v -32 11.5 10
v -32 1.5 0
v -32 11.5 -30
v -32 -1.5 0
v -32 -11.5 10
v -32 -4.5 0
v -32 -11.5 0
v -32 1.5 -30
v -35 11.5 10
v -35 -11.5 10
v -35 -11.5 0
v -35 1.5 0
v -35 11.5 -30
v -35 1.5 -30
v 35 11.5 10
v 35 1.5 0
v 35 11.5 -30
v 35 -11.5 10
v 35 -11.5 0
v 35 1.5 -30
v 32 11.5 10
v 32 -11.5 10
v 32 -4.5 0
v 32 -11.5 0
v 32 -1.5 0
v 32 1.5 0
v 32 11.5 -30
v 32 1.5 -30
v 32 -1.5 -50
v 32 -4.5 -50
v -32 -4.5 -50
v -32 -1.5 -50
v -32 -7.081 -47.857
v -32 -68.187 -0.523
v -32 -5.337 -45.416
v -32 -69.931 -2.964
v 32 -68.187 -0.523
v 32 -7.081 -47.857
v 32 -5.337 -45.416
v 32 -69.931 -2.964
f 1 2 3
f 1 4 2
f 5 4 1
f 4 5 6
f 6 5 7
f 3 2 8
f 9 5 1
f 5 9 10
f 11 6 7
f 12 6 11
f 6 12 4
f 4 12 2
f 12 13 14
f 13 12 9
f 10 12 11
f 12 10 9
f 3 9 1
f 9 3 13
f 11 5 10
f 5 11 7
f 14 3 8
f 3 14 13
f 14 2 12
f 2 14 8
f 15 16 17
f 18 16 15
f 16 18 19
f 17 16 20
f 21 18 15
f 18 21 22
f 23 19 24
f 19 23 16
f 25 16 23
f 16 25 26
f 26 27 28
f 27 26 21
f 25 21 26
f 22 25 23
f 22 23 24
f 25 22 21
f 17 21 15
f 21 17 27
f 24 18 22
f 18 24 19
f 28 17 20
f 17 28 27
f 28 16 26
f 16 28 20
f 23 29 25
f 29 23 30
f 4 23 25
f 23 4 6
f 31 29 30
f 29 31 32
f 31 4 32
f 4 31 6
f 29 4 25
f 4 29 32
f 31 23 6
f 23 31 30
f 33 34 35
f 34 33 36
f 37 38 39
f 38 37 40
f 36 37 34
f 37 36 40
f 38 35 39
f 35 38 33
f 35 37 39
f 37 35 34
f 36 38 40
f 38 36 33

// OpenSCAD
// file: front.scad
include <../config.scad>;

module pot_front()
{
    angle = atan(pot_y/pot_z);
    diagonal_length = sqrt(pow(pot_y,2) + pow(pot_z,2));

    e = material_z/2;
    m = material_z;
    d1 = m / sin(angle);
    f = sin(angle) * e;
    d2 = f / sin(90-angle);
    lower_inset = d1 + d2;

    upper_inset = 3;

    translate([
        0,
        -sin(angle)*lower_inset - material_z/2,
        -pot_z + sin(90-angle)*lower_inset
        ])
    rotate([
        angle,
        0,
        0
        ])
    // rotate round the bottom middle
    translate([
        0,
        0,
        (diagonal_length - lower_inset - upper_inset)/2
        ])
    cube([
        pot_x - 2*material_z,
        material_z,
        diagonal_length - lower_inset - upper_inset
        ], center=true);
}

pot_front();
// file: back.scad
include <../config.scad>;

module pot_back()
{
    translate([
        0,
        -material_z,
        -pot_z/2
        ])
    cube([
        pot_x - 2*material_z,
        material_z,
        pot_z
        ], center=true);
}

pot_back();
// file: side.scad
include <../config.scad>;

module pot_side(x)
{
    translate([
        x,
        -material_z/2,
        0
        ])
    intersection()
    {
        // scale to configured size
        scale([
            material_z,
            pot_y,
            pot_z
            ])
        // rotate into yz plane
        rotate([
            0,
            90,
            0
            ])
        circle(
            r=1
            );

        // z: negative, y: negative
        translate([
            0,
            -pot_y,
            -pot_z
            ])
        cube([
            2*material_z,
            2*pot_y,
            2*pot_z
            ], center=true);
    }

    // upper hook part
    translate([
        x,
        0,
        hook_width/2
        ])
    cube([
        material_z,
        hook_width*2 + material_z,
        hook_width
        ], center=true);

    // hook
    translate([
        x,
        hook_width/2 + material_z/2,
        -support_z/2
        ])
    cube([
        material_z,
        hook_width,
        support_z
        ], center=true);
}

pot_side(0);
// file: ../config.scad
// all measures in millimeters

// rendering quality
$fn = 200;

// material to cut from
material_z = 3;

// wall configuration: bounding box measures
wall_x = 550;
wall_y = 150;
wall_z = 400;

wall_width = 30;
foot_z = 30;

// pots are hung at wall supports
support_count = 5;
support_z = 30;

// pot configuration: outer measures of the top opening
pot_x = 70;
pot_y = 70;
pot_z = 50;

// pots have hooks to hang at the wall supports
hook_width = 10;
// main file
include <../config.scad>;
use <side.scad>;
use <back.scad>;
use <front.scad>;

module pot()
{
    for (x = [
            -pot_x/2 + material_z/2,
            +pot_x/2 - material_z/2
            ])
    {
        pot_side(x);
    }

    pot_back();

    #pot_front();
}

pot();
